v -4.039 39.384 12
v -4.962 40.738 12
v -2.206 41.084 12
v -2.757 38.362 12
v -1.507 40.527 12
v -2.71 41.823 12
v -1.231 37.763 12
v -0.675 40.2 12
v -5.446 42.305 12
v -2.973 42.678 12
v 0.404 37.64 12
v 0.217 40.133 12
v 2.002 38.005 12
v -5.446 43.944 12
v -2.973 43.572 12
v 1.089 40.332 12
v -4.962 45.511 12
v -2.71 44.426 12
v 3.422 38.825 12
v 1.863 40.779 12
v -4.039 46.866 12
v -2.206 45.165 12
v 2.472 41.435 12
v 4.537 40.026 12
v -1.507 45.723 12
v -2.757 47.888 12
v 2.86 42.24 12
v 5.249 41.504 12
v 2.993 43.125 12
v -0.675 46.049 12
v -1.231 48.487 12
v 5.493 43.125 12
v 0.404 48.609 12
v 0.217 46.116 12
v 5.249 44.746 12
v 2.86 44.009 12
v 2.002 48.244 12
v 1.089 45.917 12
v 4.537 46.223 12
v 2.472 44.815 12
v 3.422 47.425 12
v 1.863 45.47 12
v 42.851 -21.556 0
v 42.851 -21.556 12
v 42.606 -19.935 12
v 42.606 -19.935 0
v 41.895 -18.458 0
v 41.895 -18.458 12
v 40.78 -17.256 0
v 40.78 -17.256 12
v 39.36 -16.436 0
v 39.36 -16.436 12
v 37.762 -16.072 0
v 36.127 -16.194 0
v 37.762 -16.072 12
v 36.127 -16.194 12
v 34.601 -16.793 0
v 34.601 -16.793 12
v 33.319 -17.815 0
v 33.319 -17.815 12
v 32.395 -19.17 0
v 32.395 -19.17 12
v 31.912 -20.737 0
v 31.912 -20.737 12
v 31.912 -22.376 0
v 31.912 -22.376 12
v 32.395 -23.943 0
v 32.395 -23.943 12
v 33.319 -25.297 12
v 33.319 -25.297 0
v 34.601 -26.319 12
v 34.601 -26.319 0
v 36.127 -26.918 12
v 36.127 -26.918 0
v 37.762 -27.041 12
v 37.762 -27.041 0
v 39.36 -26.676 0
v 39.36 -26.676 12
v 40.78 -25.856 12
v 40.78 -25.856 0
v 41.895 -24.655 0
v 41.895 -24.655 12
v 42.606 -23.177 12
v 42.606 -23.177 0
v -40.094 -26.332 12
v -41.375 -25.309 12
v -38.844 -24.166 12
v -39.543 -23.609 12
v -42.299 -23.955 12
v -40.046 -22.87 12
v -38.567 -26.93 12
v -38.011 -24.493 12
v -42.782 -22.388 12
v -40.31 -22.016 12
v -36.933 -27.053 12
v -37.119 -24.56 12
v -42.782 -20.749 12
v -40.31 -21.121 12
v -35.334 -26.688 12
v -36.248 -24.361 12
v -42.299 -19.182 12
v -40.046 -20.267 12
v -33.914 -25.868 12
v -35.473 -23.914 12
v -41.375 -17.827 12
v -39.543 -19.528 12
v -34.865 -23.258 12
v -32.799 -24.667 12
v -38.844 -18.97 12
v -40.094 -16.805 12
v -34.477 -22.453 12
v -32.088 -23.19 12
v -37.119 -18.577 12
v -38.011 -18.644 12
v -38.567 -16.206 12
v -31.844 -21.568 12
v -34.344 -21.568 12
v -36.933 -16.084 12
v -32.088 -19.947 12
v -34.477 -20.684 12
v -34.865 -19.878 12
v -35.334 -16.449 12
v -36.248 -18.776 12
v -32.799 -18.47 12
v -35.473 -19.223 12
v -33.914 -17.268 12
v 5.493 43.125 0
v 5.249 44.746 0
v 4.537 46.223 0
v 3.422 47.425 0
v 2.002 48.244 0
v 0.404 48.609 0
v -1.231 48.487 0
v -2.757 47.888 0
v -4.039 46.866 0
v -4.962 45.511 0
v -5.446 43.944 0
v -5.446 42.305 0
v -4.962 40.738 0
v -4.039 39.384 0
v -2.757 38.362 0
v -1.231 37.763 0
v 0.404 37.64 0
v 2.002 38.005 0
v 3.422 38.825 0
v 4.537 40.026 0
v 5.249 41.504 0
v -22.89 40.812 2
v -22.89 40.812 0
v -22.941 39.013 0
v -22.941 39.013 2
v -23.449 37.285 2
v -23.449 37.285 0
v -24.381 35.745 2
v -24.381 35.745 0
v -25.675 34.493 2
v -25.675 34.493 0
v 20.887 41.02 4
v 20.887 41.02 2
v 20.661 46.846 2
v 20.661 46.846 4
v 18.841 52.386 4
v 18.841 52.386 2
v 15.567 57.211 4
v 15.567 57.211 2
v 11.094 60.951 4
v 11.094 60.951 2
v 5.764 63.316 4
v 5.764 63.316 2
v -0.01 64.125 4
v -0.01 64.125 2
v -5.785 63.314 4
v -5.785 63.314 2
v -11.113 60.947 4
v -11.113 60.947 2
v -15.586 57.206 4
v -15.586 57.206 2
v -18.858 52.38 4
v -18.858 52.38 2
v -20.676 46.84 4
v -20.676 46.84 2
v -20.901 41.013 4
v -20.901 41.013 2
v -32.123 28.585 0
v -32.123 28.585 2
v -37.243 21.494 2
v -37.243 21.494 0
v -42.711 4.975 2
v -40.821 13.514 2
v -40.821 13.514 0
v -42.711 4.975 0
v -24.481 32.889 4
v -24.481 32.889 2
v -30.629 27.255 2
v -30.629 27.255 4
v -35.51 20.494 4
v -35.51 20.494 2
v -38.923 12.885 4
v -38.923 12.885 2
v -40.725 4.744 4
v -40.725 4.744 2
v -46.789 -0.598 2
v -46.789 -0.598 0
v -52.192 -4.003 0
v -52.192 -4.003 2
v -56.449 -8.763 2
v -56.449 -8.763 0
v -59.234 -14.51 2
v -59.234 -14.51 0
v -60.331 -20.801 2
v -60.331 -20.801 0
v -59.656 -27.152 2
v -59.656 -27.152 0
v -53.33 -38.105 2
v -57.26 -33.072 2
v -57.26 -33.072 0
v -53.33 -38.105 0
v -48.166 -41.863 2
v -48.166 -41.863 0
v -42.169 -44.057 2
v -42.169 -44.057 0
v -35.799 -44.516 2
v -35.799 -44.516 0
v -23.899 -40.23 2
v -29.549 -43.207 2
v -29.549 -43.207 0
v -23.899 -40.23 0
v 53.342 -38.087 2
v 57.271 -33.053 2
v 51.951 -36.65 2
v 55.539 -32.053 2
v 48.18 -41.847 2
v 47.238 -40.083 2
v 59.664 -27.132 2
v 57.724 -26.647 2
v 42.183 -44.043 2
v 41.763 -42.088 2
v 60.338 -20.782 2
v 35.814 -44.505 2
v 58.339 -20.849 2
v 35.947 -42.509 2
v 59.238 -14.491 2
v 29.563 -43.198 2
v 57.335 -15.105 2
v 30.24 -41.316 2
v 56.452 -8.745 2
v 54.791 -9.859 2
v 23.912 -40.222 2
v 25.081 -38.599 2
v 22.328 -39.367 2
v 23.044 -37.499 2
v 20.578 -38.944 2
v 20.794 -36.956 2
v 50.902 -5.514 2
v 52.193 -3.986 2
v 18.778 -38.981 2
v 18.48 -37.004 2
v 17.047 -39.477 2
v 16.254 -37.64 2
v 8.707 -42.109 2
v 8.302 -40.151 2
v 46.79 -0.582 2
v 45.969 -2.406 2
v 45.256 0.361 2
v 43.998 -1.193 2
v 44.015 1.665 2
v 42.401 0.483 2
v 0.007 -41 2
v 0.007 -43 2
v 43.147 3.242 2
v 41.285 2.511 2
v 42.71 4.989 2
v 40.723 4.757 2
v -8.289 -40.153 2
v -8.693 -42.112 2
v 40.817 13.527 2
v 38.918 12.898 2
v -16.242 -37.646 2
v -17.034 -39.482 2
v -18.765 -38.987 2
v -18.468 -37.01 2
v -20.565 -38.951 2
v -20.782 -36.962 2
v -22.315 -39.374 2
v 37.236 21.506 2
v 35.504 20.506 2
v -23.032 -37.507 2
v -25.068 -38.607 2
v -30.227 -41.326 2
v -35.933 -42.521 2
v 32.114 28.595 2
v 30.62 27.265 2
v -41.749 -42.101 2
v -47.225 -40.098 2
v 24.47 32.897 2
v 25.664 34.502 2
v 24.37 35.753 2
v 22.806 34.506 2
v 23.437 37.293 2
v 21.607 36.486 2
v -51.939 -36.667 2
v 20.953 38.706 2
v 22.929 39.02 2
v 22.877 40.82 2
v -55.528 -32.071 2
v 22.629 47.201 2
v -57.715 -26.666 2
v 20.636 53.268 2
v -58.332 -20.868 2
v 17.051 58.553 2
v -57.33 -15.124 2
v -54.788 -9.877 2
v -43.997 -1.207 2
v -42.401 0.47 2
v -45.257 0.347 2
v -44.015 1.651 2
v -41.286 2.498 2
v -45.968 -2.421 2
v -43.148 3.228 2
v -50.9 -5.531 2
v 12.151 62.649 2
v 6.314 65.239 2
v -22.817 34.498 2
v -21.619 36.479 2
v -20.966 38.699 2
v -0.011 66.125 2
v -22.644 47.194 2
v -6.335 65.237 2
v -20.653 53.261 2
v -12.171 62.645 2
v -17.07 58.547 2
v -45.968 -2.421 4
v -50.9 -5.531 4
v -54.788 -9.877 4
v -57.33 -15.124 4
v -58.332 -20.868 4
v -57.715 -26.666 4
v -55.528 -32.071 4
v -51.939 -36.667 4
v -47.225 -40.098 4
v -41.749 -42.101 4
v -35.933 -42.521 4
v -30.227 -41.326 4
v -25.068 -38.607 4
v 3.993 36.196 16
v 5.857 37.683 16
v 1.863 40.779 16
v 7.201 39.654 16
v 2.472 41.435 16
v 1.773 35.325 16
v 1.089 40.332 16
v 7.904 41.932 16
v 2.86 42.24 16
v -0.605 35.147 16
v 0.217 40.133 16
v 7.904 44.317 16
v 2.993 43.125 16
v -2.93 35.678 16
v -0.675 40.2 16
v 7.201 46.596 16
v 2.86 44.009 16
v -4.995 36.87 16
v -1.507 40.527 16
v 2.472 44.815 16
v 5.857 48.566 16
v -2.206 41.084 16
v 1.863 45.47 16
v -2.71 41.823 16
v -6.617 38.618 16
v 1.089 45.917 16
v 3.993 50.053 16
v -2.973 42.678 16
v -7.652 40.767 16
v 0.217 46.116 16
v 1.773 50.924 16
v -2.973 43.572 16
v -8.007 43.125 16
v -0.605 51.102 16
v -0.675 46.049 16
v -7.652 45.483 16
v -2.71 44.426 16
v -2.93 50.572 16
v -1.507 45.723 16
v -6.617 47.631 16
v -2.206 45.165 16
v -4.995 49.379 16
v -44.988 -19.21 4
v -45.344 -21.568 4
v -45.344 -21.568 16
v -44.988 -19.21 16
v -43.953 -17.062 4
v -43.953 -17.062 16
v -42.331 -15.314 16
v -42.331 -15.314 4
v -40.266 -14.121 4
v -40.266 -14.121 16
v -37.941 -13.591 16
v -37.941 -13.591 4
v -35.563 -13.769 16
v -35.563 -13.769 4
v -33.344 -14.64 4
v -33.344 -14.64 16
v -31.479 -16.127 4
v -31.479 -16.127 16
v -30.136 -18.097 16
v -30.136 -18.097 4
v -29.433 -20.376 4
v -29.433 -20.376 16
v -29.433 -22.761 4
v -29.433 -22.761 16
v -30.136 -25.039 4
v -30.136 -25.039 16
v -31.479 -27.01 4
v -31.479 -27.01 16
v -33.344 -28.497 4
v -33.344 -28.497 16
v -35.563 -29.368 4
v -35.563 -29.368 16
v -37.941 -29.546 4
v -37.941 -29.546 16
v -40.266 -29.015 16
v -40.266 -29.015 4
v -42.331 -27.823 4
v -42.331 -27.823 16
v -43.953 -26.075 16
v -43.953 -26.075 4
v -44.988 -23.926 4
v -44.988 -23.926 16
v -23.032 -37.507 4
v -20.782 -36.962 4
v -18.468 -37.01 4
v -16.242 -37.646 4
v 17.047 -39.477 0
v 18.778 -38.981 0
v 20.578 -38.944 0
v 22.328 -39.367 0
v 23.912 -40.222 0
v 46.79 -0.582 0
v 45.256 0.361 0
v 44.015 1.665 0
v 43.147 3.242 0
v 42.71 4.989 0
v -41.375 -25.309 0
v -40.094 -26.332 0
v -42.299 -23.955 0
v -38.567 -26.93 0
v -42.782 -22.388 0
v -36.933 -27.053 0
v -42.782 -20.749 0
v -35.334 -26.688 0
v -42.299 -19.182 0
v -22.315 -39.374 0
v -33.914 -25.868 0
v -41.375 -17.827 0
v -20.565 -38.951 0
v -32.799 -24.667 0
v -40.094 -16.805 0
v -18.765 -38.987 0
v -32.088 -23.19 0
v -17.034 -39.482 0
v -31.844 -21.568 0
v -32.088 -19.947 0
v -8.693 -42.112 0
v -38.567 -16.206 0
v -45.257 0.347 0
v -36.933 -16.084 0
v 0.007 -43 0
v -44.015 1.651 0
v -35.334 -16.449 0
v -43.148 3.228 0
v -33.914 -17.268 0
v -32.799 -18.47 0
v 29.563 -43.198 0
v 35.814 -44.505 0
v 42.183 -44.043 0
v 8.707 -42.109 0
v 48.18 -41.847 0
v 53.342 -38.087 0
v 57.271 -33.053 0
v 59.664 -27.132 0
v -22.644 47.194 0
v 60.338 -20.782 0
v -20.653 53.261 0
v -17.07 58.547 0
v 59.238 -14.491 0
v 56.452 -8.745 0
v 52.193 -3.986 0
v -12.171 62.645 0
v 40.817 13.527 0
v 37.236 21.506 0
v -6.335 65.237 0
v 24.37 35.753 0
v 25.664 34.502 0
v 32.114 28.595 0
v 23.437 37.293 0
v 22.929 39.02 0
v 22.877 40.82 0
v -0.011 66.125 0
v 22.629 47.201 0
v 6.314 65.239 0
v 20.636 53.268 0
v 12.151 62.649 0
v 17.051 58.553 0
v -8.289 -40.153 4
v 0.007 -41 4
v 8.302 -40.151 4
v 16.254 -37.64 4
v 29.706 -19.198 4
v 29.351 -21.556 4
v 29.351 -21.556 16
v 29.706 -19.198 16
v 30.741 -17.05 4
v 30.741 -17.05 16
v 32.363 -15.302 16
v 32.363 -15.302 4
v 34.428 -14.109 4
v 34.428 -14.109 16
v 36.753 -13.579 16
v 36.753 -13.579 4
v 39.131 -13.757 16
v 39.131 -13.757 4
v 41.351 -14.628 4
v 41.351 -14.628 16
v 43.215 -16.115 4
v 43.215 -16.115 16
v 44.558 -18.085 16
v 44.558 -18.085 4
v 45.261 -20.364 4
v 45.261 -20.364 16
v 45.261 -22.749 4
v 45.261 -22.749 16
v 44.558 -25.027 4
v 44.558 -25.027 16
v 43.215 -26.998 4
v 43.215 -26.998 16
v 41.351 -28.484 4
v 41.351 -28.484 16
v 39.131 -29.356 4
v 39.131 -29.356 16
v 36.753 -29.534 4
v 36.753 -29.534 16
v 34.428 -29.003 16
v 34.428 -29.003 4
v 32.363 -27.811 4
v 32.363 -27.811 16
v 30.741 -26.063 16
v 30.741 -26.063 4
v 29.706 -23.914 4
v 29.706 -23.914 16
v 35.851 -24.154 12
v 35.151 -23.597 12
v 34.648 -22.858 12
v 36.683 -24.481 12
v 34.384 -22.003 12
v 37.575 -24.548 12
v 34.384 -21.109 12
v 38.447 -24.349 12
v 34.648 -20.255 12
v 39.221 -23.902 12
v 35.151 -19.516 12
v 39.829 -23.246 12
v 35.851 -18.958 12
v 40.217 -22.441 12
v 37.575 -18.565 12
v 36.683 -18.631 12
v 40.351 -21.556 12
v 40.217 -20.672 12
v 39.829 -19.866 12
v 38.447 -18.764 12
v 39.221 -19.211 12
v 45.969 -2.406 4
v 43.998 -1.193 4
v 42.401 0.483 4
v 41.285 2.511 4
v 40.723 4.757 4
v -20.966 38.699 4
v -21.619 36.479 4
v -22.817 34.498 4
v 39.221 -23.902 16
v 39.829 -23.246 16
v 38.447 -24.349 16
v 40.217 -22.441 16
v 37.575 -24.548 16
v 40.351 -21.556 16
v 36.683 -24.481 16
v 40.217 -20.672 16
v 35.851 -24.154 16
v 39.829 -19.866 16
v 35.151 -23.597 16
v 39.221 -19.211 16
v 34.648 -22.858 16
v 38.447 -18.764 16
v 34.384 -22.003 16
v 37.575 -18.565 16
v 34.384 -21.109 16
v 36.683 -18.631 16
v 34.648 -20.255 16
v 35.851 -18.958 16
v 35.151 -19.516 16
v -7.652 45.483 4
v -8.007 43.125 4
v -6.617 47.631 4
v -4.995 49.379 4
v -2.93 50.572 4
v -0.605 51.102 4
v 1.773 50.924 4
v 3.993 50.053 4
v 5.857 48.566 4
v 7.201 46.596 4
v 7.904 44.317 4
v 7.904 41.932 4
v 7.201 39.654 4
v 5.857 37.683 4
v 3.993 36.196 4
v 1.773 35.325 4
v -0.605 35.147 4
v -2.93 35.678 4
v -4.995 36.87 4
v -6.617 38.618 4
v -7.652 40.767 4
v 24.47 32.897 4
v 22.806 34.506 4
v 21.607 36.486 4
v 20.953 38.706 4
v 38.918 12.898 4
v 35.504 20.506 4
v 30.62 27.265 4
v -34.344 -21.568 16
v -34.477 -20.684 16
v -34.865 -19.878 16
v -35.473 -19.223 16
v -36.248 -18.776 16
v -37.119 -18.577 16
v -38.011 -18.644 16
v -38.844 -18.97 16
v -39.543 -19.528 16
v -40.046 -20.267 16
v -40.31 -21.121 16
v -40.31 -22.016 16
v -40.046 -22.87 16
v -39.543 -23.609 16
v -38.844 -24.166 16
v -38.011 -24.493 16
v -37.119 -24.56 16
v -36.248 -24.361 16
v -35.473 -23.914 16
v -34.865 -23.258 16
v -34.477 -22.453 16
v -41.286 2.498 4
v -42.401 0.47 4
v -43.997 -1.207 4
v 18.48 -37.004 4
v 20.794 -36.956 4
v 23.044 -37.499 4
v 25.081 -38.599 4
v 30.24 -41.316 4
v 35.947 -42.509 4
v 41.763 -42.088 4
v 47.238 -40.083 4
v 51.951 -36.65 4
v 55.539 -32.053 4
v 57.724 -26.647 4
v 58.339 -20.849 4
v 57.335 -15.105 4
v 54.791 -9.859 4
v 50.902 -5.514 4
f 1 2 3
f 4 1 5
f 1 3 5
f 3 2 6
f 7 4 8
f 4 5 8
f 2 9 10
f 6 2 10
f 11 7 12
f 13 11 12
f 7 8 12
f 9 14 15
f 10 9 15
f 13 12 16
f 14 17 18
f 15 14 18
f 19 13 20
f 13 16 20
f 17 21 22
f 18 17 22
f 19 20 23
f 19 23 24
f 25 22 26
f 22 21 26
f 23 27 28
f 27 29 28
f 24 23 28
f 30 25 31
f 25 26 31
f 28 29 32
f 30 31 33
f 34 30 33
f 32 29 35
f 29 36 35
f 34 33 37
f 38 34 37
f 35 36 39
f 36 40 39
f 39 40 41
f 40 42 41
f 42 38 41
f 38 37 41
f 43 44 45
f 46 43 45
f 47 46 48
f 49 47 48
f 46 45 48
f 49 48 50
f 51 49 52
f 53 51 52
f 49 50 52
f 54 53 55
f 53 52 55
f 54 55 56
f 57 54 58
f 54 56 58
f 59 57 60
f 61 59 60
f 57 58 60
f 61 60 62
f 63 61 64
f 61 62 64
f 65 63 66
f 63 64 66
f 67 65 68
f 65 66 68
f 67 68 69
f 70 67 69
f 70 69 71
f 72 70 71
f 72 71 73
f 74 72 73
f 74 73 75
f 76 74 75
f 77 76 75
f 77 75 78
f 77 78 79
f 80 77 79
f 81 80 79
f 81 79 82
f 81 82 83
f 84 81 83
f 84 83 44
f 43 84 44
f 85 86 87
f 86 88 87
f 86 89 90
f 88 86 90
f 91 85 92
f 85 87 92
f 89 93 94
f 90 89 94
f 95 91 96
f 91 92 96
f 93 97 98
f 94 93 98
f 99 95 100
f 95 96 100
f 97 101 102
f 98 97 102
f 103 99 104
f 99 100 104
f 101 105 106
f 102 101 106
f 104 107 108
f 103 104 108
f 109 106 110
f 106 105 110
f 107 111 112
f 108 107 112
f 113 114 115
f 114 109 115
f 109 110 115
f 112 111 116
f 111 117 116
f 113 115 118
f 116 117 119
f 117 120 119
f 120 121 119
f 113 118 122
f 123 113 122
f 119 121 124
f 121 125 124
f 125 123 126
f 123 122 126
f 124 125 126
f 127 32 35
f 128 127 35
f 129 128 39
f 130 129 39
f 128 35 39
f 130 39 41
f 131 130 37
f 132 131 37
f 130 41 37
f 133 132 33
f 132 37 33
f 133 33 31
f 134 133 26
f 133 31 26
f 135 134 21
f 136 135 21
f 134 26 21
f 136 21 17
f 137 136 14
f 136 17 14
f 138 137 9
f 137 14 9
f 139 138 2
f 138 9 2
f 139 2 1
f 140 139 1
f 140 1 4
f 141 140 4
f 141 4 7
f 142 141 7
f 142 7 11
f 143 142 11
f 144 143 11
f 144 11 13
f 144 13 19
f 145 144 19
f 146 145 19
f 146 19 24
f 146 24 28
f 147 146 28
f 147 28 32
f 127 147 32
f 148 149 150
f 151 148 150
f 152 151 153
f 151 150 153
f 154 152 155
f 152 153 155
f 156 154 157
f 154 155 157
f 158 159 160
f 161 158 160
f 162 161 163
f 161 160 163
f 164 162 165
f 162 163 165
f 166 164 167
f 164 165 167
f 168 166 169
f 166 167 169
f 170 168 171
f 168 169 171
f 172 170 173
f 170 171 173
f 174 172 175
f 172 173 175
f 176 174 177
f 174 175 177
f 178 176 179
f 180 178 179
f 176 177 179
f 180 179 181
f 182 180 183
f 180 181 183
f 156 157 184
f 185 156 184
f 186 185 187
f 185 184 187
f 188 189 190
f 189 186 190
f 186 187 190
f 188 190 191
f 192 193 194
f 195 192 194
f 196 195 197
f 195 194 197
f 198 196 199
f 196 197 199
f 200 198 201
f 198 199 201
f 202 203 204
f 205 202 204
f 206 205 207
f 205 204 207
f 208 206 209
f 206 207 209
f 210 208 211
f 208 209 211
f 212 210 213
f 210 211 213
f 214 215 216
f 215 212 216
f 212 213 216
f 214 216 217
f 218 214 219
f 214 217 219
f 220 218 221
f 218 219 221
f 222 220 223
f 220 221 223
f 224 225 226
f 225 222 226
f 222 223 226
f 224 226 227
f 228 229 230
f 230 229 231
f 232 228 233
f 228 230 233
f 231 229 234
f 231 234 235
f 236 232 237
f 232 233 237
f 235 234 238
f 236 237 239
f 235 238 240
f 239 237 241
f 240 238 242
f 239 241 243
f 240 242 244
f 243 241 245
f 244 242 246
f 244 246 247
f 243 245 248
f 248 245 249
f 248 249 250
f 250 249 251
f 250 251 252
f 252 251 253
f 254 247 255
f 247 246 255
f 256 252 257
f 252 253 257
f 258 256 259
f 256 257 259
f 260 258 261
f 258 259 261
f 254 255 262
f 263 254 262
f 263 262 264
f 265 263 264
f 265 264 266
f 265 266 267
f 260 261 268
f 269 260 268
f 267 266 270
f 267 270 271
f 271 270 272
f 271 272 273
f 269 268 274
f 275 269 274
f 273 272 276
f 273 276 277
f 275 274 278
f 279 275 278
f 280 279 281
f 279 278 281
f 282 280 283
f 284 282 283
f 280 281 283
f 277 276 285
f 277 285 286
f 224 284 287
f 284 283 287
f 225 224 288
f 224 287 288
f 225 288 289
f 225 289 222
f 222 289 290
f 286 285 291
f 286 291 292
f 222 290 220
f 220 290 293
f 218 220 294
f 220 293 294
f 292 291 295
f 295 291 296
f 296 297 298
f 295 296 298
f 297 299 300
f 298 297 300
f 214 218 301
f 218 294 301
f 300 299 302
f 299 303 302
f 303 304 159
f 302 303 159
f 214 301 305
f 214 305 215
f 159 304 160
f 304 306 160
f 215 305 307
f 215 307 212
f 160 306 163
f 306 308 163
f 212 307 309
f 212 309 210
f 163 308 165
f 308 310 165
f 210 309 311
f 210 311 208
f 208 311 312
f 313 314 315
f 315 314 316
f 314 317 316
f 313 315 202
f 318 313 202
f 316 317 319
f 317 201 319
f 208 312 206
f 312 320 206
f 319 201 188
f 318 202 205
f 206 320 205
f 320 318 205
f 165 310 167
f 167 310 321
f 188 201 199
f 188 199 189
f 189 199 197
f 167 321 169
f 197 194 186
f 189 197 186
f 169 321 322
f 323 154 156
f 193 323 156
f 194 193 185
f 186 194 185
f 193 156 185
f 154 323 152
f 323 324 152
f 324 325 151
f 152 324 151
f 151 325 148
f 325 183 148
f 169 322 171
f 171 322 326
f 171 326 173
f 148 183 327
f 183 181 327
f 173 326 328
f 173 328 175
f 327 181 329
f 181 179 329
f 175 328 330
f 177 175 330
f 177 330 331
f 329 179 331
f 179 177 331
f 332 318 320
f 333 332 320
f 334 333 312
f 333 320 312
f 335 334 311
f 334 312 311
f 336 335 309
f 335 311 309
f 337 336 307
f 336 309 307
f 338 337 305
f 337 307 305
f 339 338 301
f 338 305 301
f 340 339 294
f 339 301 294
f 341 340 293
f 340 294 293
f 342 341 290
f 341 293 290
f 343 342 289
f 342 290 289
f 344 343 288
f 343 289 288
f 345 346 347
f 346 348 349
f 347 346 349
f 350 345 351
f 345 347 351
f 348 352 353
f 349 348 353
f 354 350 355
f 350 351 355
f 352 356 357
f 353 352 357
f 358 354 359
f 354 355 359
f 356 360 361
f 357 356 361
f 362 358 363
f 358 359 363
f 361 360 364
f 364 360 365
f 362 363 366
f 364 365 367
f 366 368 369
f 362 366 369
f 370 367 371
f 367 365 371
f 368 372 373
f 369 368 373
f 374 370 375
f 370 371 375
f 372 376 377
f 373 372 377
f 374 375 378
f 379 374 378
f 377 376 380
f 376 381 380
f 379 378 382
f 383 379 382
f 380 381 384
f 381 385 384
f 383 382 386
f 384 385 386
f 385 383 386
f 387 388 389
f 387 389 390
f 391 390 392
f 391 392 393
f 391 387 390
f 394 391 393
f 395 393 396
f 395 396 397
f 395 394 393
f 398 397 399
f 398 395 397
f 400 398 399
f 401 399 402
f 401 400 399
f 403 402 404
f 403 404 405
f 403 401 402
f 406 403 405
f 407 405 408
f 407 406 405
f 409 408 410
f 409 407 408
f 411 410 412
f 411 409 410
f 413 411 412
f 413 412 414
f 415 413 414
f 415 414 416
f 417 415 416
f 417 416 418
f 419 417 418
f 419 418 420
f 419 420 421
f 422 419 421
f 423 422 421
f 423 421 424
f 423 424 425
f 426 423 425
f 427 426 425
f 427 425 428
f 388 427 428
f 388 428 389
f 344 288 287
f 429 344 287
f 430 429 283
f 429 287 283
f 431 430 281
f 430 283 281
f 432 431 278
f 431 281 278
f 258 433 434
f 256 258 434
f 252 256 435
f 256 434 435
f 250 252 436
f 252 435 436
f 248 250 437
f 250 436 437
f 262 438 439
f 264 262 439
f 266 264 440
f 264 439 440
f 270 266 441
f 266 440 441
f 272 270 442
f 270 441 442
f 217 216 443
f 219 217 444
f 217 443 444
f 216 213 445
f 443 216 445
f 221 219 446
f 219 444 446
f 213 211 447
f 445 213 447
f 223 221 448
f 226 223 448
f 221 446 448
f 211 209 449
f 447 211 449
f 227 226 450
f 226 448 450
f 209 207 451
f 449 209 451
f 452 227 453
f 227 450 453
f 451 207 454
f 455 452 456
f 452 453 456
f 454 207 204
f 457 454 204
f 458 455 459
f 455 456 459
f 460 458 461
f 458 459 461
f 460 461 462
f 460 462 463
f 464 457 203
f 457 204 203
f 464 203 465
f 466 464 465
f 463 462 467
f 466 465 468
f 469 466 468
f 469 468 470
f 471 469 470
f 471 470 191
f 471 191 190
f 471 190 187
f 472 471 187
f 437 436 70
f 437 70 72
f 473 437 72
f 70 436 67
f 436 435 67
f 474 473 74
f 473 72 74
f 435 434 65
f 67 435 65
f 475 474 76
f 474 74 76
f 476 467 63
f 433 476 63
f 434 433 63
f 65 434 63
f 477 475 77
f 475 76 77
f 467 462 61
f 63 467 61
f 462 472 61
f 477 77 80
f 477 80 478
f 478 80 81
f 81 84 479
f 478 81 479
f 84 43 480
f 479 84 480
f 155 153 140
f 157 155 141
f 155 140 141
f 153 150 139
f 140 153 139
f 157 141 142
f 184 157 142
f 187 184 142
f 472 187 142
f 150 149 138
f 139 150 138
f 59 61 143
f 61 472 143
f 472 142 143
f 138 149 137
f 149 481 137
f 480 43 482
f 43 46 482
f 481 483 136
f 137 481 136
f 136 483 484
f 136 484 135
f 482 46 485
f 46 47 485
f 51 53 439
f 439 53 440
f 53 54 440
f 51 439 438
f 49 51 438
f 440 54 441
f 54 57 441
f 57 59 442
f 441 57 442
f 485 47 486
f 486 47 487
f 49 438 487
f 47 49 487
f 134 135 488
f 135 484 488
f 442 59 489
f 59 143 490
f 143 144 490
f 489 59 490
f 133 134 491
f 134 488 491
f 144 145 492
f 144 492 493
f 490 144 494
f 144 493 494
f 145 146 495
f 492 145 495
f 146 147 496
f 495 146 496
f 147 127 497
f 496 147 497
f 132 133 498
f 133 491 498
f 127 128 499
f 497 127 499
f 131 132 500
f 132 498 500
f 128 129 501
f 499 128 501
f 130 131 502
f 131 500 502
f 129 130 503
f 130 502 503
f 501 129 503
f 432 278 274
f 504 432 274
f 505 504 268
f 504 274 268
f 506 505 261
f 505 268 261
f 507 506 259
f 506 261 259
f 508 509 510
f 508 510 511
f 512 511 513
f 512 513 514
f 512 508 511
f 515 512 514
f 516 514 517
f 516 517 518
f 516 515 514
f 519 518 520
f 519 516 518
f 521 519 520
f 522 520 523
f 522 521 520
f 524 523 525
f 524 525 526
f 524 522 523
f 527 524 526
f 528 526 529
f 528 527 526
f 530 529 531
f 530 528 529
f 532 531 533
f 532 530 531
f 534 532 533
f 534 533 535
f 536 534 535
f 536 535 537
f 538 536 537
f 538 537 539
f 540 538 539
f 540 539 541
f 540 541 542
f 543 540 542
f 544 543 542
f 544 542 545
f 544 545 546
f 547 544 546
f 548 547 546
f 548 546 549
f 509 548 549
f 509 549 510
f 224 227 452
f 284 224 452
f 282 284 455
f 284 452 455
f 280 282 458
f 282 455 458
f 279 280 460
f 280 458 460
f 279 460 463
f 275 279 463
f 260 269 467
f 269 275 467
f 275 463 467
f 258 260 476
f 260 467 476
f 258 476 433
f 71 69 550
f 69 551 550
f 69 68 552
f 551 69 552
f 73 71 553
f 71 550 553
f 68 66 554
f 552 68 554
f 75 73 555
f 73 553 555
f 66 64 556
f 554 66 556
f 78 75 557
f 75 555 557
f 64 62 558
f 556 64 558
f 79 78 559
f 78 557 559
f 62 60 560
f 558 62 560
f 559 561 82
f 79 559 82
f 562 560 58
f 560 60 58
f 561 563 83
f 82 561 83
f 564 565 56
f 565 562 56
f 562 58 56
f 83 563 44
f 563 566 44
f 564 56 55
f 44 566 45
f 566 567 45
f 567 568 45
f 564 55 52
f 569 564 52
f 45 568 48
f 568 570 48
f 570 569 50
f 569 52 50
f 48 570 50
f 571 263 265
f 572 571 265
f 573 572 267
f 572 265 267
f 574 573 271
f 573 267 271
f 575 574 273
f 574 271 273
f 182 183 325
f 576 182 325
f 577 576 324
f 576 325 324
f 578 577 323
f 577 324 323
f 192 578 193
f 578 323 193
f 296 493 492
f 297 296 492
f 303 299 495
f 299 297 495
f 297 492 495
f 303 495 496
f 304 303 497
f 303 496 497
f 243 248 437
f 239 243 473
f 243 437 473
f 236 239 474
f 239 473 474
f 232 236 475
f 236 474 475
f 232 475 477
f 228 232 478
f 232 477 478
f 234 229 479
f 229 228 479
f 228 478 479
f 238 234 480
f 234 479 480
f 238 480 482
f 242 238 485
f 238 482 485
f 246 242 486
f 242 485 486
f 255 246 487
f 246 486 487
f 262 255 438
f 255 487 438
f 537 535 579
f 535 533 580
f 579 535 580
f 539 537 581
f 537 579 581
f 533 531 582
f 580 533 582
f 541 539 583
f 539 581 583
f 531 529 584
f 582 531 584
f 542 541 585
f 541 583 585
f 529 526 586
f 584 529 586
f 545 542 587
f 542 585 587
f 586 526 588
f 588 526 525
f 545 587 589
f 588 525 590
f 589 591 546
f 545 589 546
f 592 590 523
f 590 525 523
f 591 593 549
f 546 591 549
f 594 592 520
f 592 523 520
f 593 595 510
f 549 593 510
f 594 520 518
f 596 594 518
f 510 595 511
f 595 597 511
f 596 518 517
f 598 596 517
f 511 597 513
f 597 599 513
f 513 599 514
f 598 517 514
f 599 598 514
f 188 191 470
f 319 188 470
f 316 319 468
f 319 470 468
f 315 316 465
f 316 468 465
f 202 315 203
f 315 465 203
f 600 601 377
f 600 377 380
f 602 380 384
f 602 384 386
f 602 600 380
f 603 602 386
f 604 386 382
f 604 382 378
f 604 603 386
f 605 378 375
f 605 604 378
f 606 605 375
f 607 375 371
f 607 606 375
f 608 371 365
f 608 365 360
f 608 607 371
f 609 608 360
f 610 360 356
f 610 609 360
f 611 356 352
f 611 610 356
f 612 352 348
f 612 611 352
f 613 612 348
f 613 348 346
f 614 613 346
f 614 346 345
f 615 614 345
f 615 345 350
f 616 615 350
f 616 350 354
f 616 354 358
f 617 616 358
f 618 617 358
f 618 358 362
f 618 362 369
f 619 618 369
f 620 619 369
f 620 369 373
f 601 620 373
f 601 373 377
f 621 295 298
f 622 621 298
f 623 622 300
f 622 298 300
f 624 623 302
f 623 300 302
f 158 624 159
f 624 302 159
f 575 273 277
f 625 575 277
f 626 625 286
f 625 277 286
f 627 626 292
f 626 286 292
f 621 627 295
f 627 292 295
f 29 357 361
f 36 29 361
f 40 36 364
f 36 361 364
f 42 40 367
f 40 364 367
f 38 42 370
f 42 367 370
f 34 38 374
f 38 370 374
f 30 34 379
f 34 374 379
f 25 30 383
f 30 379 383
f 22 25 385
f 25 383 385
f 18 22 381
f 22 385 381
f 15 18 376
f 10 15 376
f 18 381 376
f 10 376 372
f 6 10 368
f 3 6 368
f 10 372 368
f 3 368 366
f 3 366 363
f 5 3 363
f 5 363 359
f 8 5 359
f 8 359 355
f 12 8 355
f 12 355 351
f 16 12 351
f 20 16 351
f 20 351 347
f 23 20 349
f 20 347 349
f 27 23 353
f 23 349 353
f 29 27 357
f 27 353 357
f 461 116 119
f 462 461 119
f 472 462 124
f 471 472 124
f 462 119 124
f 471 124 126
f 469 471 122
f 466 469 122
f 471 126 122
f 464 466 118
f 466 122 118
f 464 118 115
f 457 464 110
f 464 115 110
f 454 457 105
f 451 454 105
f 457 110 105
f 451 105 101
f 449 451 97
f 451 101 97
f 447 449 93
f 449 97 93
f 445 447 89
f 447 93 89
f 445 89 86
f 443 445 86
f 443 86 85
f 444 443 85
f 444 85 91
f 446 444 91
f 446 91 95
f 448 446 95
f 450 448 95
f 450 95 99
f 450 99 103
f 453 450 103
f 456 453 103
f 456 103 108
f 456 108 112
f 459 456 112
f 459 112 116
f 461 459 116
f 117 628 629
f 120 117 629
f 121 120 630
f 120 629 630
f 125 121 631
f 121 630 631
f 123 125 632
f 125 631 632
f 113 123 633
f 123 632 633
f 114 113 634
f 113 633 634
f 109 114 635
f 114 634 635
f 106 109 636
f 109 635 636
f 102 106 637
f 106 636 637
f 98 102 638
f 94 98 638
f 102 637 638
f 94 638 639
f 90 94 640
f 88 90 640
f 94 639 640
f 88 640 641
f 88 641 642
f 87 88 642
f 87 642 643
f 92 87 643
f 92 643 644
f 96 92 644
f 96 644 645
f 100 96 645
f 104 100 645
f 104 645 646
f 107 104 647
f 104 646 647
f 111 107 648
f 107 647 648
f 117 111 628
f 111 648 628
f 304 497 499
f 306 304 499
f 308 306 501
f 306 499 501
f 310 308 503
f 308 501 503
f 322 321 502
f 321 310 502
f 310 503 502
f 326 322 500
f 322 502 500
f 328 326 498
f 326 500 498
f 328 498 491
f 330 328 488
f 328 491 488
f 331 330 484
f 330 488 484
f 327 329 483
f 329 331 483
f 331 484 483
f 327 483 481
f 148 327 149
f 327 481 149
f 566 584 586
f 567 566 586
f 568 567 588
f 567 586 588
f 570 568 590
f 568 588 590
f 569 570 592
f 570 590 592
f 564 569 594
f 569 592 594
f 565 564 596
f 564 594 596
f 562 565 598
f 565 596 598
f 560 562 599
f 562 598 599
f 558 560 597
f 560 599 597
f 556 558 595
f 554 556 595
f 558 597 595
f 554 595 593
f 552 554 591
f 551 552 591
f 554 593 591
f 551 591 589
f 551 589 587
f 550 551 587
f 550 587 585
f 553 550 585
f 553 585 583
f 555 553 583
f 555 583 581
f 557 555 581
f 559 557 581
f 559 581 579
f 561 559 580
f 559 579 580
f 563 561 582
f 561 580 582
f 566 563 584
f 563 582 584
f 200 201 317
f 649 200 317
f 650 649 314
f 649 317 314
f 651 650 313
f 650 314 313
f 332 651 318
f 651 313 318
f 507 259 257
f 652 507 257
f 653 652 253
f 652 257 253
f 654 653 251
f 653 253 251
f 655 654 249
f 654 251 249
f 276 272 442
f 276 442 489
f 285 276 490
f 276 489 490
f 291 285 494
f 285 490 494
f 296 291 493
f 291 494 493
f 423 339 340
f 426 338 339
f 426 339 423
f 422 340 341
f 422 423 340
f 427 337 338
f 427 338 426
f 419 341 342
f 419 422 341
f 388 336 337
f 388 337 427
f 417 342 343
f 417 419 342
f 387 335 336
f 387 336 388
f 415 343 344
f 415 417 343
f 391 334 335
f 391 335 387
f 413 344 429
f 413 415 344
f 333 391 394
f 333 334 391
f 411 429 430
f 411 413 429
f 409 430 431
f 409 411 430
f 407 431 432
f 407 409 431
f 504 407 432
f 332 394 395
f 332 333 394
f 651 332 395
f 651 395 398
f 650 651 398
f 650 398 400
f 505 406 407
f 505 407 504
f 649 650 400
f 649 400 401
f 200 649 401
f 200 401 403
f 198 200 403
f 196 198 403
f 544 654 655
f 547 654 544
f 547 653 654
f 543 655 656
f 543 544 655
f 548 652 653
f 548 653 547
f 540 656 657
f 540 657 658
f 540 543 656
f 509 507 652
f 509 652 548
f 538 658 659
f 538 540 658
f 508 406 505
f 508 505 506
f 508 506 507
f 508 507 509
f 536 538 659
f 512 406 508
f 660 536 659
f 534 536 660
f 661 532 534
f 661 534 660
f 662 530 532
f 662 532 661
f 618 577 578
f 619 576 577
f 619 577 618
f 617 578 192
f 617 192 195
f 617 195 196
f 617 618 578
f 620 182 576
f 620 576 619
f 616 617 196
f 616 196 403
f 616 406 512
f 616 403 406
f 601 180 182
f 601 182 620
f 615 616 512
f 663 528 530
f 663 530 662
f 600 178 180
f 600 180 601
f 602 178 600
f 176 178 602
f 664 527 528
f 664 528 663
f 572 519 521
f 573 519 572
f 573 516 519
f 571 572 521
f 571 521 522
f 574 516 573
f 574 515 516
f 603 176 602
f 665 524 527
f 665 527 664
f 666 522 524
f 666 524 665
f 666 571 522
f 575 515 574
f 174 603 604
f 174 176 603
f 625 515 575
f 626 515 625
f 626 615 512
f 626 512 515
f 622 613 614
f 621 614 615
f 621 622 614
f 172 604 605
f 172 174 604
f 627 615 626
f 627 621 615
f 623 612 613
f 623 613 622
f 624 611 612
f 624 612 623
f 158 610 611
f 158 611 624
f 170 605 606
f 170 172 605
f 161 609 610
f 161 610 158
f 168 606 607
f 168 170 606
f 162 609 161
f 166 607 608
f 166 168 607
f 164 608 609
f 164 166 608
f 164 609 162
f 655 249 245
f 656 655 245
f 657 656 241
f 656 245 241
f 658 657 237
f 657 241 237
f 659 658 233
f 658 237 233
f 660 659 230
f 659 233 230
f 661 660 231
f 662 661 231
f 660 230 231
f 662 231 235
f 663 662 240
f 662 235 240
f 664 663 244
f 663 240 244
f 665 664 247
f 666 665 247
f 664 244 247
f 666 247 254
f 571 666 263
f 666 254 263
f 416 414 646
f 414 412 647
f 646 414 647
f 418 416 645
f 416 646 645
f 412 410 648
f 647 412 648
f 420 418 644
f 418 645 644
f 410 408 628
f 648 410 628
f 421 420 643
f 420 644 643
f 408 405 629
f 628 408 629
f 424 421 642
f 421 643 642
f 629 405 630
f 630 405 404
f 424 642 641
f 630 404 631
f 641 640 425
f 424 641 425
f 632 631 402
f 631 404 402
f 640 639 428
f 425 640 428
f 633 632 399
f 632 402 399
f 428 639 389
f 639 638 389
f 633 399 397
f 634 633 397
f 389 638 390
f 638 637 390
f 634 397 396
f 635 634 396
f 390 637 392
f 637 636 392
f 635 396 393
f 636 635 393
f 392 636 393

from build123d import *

# Parameters (mm, degrees)
SKETCH1_R           = 5.5
BOSS_EXTRUDE1_DEPTH = 4
CUT_EXTRUDE1_START  = -2
CUT_EXTRUDE1_DEPTH  = 2
SKETCH4_R           = 8
BOSS_EXTRUDE2_DEPTH = 16
SKETCH6_R           = 3
CUT_EXTRUDE2_DEPTH  = 4
SKETCH7_R           = 5.5
CUT_EXTRUDE3_DEPTH  = 91.325305156


with BuildPart() as part:
    # Sketch1 → Boss-Extrude1 (new body)
    with BuildSketch(Plane.XY):
        with BuildLine():
            ThreePointArc((22.877204778, 40.819588003), (-0.010726273, 66.124665414), (-22.890446501, 40.812163899))
            ThreePointArc((-22.890446501, 40.812163899), (-23.449446231, 37.285381871), (-25.675278589, 34.493188739))
            ThreePointArc((-25.675278589, 34.493188739), (-37.24257945, 21.493959056), (-42.711233264, 4.974992775))
            ThreePointArc((-42.711233264, 4.974992775), (-44.015348899, 1.650845578), (-46.789402571, -0.597553496))
            ThreePointArc((-46.789402571, -0.597553496), (-57.260276929, -33.071621932), (-23.89914747, -40.229790123))
            ThreePointArc((-23.89914747, -40.229790123), (-20.565364774, -38.950507076), (-17.034338411, -39.482037877))
            ThreePointArc((-17.034338411, -39.482037877), (0.006975154, -42.999999434), (17.047146505, -39.476509421))
            ThreePointArc((17.047146505, -39.476509421), (20.578000241, -38.943833092), (23.912197793, -40.222034507))
            ThreePointArc((23.912197793, -40.222034507), (57.271003202, -33.053043482), (46.789593971, -0.582373776))
            ThreePointArc((46.789593971, -0.582373776), (44.014811006, 1.665125206), (42.709617, 4.988849138))
            ThreePointArc((42.709617, 4.988849138), (37.235604296, 21.506040378), (25.664086758, 34.501516646))
            ThreePointArc((25.664086758, 34.501516646), (23.437348658, 37.292987514), (22.877204778, 40.819588003))
        make_face()
        with Locations((-0.006995377, 43.124665717)):
            Circle(SKETCH1_R, mode=Mode.SUBTRACT)
        with Locations((37.350553729, -21.556274684)):
            Circle(SKETCH1_R, mode=Mode.SUBTRACT)
        with Locations((-37.343558352, -21.568391032)):
            Circle(SKETCH1_R, mode=Mode.SUBTRACT)
    extrude(amount=BOSS_EXTRUDE1_DEPTH)

    # Sketch2 → Cut-Extrude1 (cut)
    with BuildSketch(Plane.XY.offset(4).offset(CUT_EXTRUDE1_START)):
        with BuildLine():
            ThreePointArc((22.877204778, 40.819588003), (23.437348658, 37.292987514), (25.664086758, 34.501516646))
            ThreePointArc((25.664086758, 34.501516646), (37.235604296, 21.506040378), (42.709617, 4.988849138))
            ThreePointArc((42.709617, 4.988849138), (44.014811006, 1.665125206), (46.789593971, -0.582373776))
            ThreePointArc((46.789593971, -0.582373776), (57.271003202, -33.053043482), (23.912197793, -40.222034507))
            ThreePointArc((23.912197793, -40.222034507), (20.578000241, -38.943833092), (17.047146505, -39.476509421))
            ThreePointArc((17.047146505, -39.476509421), (0.006975154, -42.999999434), (-17.034338411, -39.482037877))
            ThreePointArc((-17.034338411, -39.482037877), (-20.565364774, -38.950507076), (-23.89914747, -40.229790123))
            ThreePointArc((-23.89914747, -40.229790123), (-57.260276929, -33.071621932), (-46.789402571, -0.597553496))
            ThreePointArc((-46.789402571, -0.597553496), (-44.015348899, 1.650845578), (-42.711233264, 4.974992775))
            ThreePointArc((-42.711233264, 4.974992775), (-37.24257945, 21.493959056), (-25.675278589, 34.493188739))
            ThreePointArc((-25.675278589, 34.493188739), (-23.449446231, 37.285381871), (-22.890446501, 40.812163899))
            ThreePointArc((-22.890446501, 40.812163899), (-0.010726273, 66.124665414), (22.877204778, 40.819588003))
        make_face()
        with BuildLine():
            ThreePointArc((-24.481079585, 32.888854379), (-35.510366452, 20.49424003), (-40.724664275, 4.743597762))
            ThreePointArc((-40.724664275, 4.743597762), (-42.401384377, 0.469694224), (-45.968024813, -2.421104586))
            ThreePointArc((-45.968024813, -2.421104586), (-55.528388357, -32.071340985), (-25.068226677, -38.607059768))
            ThreePointArc((-25.068226677, -38.607059768), (-20.78193464, -36.962267279), (-16.242043601, -37.645664022))
            ThreePointArc((-16.242043601, -37.645664022), (0.006650729, -40.999999461), (16.25425597, -37.640392703))
            ThreePointArc((16.25425597, -37.640392703), (20.793925059, -36.955523138), (25.080750483, -38.598924957))
            ThreePointArc((25.080750483, -38.598924957), (55.538790204, -32.053324456), (45.968807863, -2.406191246))
            ThreePointArc((45.968807863, -2.406191246), (42.401229765, 0.483450301), (40.723123186, 4.756809644))
            ThreePointArc((40.723123186, 4.756809644), (35.503715724, 20.50575943), (24.470408304, 32.896794941))
            ThreePointArc((24.470408304, 32.896794941), (21.607459318, 36.485828914), (20.88727433, 41.020029543))
            ThreePointArc((20.88727433, 41.020029543), (-0.010401848, 64.12466544), (-20.900581186, 41.013251014))
            ThreePointArc((-20.900581186, 41.013251014), (-21.619295125, 36.478816977), (-24.481079585, 32.888854379))
        make_face(mode=Mode.SUBTRACT)
    extrude(amount=CUT_EXTRUDE1_DEPTH, mode=Mode.SUBTRACT)

    # Sketch4 → Boss-Extrude2 (add)
    with BuildSketch(Plane(origin=(0, 0, 0), x_dir=(-1, 0, 0), z_dir=(0, 0, -1))):
        with Locations((0.006995377, 43.124665717)):
            Circle(SKETCH4_R)
        with Locations((-37.350553729, -21.556274684)):
            Circle(SKETCH4_R)
        with Locations((37.343558352, -21.568391032)):
            Circle(SKETCH4_R)
    extrude(amount=-BOSS_EXTRUDE2_DEPTH)

    # Sketch6 → Cut-Extrude2 (cut)
    with BuildSketch(Plane.XY.offset(16)):
        with Locations((-0.006995377, 43.124665717)):
            Circle(SKETCH6_R)
        with Locations((-37.343558352, -21.568391032)):
            Circle(SKETCH6_R)
        with Locations((37.350553729, -21.556274684)):
            Circle(SKETCH6_R)
    extrude(amount=-CUT_EXTRUDE2_DEPTH, mode=Mode.SUBTRACT)

    # Sketch7 → Cut-Extrude3 (cut, through all)
    with BuildSketch(Plane.XY.offset(12)):
        with Locations((-0.006995377, 43.124665717)):
            Circle(SKETCH7_R)
        with Locations((-37.343558352, -21.568391032)):
            Circle(SKETCH7_R)
        with Locations((37.350553729, -21.556274684)):
            Circle(SKETCH7_R)
    extrude(amount=-CUT_EXTRUDE3_DEPTH, mode=Mode.SUBTRACT)


solid = part.part
